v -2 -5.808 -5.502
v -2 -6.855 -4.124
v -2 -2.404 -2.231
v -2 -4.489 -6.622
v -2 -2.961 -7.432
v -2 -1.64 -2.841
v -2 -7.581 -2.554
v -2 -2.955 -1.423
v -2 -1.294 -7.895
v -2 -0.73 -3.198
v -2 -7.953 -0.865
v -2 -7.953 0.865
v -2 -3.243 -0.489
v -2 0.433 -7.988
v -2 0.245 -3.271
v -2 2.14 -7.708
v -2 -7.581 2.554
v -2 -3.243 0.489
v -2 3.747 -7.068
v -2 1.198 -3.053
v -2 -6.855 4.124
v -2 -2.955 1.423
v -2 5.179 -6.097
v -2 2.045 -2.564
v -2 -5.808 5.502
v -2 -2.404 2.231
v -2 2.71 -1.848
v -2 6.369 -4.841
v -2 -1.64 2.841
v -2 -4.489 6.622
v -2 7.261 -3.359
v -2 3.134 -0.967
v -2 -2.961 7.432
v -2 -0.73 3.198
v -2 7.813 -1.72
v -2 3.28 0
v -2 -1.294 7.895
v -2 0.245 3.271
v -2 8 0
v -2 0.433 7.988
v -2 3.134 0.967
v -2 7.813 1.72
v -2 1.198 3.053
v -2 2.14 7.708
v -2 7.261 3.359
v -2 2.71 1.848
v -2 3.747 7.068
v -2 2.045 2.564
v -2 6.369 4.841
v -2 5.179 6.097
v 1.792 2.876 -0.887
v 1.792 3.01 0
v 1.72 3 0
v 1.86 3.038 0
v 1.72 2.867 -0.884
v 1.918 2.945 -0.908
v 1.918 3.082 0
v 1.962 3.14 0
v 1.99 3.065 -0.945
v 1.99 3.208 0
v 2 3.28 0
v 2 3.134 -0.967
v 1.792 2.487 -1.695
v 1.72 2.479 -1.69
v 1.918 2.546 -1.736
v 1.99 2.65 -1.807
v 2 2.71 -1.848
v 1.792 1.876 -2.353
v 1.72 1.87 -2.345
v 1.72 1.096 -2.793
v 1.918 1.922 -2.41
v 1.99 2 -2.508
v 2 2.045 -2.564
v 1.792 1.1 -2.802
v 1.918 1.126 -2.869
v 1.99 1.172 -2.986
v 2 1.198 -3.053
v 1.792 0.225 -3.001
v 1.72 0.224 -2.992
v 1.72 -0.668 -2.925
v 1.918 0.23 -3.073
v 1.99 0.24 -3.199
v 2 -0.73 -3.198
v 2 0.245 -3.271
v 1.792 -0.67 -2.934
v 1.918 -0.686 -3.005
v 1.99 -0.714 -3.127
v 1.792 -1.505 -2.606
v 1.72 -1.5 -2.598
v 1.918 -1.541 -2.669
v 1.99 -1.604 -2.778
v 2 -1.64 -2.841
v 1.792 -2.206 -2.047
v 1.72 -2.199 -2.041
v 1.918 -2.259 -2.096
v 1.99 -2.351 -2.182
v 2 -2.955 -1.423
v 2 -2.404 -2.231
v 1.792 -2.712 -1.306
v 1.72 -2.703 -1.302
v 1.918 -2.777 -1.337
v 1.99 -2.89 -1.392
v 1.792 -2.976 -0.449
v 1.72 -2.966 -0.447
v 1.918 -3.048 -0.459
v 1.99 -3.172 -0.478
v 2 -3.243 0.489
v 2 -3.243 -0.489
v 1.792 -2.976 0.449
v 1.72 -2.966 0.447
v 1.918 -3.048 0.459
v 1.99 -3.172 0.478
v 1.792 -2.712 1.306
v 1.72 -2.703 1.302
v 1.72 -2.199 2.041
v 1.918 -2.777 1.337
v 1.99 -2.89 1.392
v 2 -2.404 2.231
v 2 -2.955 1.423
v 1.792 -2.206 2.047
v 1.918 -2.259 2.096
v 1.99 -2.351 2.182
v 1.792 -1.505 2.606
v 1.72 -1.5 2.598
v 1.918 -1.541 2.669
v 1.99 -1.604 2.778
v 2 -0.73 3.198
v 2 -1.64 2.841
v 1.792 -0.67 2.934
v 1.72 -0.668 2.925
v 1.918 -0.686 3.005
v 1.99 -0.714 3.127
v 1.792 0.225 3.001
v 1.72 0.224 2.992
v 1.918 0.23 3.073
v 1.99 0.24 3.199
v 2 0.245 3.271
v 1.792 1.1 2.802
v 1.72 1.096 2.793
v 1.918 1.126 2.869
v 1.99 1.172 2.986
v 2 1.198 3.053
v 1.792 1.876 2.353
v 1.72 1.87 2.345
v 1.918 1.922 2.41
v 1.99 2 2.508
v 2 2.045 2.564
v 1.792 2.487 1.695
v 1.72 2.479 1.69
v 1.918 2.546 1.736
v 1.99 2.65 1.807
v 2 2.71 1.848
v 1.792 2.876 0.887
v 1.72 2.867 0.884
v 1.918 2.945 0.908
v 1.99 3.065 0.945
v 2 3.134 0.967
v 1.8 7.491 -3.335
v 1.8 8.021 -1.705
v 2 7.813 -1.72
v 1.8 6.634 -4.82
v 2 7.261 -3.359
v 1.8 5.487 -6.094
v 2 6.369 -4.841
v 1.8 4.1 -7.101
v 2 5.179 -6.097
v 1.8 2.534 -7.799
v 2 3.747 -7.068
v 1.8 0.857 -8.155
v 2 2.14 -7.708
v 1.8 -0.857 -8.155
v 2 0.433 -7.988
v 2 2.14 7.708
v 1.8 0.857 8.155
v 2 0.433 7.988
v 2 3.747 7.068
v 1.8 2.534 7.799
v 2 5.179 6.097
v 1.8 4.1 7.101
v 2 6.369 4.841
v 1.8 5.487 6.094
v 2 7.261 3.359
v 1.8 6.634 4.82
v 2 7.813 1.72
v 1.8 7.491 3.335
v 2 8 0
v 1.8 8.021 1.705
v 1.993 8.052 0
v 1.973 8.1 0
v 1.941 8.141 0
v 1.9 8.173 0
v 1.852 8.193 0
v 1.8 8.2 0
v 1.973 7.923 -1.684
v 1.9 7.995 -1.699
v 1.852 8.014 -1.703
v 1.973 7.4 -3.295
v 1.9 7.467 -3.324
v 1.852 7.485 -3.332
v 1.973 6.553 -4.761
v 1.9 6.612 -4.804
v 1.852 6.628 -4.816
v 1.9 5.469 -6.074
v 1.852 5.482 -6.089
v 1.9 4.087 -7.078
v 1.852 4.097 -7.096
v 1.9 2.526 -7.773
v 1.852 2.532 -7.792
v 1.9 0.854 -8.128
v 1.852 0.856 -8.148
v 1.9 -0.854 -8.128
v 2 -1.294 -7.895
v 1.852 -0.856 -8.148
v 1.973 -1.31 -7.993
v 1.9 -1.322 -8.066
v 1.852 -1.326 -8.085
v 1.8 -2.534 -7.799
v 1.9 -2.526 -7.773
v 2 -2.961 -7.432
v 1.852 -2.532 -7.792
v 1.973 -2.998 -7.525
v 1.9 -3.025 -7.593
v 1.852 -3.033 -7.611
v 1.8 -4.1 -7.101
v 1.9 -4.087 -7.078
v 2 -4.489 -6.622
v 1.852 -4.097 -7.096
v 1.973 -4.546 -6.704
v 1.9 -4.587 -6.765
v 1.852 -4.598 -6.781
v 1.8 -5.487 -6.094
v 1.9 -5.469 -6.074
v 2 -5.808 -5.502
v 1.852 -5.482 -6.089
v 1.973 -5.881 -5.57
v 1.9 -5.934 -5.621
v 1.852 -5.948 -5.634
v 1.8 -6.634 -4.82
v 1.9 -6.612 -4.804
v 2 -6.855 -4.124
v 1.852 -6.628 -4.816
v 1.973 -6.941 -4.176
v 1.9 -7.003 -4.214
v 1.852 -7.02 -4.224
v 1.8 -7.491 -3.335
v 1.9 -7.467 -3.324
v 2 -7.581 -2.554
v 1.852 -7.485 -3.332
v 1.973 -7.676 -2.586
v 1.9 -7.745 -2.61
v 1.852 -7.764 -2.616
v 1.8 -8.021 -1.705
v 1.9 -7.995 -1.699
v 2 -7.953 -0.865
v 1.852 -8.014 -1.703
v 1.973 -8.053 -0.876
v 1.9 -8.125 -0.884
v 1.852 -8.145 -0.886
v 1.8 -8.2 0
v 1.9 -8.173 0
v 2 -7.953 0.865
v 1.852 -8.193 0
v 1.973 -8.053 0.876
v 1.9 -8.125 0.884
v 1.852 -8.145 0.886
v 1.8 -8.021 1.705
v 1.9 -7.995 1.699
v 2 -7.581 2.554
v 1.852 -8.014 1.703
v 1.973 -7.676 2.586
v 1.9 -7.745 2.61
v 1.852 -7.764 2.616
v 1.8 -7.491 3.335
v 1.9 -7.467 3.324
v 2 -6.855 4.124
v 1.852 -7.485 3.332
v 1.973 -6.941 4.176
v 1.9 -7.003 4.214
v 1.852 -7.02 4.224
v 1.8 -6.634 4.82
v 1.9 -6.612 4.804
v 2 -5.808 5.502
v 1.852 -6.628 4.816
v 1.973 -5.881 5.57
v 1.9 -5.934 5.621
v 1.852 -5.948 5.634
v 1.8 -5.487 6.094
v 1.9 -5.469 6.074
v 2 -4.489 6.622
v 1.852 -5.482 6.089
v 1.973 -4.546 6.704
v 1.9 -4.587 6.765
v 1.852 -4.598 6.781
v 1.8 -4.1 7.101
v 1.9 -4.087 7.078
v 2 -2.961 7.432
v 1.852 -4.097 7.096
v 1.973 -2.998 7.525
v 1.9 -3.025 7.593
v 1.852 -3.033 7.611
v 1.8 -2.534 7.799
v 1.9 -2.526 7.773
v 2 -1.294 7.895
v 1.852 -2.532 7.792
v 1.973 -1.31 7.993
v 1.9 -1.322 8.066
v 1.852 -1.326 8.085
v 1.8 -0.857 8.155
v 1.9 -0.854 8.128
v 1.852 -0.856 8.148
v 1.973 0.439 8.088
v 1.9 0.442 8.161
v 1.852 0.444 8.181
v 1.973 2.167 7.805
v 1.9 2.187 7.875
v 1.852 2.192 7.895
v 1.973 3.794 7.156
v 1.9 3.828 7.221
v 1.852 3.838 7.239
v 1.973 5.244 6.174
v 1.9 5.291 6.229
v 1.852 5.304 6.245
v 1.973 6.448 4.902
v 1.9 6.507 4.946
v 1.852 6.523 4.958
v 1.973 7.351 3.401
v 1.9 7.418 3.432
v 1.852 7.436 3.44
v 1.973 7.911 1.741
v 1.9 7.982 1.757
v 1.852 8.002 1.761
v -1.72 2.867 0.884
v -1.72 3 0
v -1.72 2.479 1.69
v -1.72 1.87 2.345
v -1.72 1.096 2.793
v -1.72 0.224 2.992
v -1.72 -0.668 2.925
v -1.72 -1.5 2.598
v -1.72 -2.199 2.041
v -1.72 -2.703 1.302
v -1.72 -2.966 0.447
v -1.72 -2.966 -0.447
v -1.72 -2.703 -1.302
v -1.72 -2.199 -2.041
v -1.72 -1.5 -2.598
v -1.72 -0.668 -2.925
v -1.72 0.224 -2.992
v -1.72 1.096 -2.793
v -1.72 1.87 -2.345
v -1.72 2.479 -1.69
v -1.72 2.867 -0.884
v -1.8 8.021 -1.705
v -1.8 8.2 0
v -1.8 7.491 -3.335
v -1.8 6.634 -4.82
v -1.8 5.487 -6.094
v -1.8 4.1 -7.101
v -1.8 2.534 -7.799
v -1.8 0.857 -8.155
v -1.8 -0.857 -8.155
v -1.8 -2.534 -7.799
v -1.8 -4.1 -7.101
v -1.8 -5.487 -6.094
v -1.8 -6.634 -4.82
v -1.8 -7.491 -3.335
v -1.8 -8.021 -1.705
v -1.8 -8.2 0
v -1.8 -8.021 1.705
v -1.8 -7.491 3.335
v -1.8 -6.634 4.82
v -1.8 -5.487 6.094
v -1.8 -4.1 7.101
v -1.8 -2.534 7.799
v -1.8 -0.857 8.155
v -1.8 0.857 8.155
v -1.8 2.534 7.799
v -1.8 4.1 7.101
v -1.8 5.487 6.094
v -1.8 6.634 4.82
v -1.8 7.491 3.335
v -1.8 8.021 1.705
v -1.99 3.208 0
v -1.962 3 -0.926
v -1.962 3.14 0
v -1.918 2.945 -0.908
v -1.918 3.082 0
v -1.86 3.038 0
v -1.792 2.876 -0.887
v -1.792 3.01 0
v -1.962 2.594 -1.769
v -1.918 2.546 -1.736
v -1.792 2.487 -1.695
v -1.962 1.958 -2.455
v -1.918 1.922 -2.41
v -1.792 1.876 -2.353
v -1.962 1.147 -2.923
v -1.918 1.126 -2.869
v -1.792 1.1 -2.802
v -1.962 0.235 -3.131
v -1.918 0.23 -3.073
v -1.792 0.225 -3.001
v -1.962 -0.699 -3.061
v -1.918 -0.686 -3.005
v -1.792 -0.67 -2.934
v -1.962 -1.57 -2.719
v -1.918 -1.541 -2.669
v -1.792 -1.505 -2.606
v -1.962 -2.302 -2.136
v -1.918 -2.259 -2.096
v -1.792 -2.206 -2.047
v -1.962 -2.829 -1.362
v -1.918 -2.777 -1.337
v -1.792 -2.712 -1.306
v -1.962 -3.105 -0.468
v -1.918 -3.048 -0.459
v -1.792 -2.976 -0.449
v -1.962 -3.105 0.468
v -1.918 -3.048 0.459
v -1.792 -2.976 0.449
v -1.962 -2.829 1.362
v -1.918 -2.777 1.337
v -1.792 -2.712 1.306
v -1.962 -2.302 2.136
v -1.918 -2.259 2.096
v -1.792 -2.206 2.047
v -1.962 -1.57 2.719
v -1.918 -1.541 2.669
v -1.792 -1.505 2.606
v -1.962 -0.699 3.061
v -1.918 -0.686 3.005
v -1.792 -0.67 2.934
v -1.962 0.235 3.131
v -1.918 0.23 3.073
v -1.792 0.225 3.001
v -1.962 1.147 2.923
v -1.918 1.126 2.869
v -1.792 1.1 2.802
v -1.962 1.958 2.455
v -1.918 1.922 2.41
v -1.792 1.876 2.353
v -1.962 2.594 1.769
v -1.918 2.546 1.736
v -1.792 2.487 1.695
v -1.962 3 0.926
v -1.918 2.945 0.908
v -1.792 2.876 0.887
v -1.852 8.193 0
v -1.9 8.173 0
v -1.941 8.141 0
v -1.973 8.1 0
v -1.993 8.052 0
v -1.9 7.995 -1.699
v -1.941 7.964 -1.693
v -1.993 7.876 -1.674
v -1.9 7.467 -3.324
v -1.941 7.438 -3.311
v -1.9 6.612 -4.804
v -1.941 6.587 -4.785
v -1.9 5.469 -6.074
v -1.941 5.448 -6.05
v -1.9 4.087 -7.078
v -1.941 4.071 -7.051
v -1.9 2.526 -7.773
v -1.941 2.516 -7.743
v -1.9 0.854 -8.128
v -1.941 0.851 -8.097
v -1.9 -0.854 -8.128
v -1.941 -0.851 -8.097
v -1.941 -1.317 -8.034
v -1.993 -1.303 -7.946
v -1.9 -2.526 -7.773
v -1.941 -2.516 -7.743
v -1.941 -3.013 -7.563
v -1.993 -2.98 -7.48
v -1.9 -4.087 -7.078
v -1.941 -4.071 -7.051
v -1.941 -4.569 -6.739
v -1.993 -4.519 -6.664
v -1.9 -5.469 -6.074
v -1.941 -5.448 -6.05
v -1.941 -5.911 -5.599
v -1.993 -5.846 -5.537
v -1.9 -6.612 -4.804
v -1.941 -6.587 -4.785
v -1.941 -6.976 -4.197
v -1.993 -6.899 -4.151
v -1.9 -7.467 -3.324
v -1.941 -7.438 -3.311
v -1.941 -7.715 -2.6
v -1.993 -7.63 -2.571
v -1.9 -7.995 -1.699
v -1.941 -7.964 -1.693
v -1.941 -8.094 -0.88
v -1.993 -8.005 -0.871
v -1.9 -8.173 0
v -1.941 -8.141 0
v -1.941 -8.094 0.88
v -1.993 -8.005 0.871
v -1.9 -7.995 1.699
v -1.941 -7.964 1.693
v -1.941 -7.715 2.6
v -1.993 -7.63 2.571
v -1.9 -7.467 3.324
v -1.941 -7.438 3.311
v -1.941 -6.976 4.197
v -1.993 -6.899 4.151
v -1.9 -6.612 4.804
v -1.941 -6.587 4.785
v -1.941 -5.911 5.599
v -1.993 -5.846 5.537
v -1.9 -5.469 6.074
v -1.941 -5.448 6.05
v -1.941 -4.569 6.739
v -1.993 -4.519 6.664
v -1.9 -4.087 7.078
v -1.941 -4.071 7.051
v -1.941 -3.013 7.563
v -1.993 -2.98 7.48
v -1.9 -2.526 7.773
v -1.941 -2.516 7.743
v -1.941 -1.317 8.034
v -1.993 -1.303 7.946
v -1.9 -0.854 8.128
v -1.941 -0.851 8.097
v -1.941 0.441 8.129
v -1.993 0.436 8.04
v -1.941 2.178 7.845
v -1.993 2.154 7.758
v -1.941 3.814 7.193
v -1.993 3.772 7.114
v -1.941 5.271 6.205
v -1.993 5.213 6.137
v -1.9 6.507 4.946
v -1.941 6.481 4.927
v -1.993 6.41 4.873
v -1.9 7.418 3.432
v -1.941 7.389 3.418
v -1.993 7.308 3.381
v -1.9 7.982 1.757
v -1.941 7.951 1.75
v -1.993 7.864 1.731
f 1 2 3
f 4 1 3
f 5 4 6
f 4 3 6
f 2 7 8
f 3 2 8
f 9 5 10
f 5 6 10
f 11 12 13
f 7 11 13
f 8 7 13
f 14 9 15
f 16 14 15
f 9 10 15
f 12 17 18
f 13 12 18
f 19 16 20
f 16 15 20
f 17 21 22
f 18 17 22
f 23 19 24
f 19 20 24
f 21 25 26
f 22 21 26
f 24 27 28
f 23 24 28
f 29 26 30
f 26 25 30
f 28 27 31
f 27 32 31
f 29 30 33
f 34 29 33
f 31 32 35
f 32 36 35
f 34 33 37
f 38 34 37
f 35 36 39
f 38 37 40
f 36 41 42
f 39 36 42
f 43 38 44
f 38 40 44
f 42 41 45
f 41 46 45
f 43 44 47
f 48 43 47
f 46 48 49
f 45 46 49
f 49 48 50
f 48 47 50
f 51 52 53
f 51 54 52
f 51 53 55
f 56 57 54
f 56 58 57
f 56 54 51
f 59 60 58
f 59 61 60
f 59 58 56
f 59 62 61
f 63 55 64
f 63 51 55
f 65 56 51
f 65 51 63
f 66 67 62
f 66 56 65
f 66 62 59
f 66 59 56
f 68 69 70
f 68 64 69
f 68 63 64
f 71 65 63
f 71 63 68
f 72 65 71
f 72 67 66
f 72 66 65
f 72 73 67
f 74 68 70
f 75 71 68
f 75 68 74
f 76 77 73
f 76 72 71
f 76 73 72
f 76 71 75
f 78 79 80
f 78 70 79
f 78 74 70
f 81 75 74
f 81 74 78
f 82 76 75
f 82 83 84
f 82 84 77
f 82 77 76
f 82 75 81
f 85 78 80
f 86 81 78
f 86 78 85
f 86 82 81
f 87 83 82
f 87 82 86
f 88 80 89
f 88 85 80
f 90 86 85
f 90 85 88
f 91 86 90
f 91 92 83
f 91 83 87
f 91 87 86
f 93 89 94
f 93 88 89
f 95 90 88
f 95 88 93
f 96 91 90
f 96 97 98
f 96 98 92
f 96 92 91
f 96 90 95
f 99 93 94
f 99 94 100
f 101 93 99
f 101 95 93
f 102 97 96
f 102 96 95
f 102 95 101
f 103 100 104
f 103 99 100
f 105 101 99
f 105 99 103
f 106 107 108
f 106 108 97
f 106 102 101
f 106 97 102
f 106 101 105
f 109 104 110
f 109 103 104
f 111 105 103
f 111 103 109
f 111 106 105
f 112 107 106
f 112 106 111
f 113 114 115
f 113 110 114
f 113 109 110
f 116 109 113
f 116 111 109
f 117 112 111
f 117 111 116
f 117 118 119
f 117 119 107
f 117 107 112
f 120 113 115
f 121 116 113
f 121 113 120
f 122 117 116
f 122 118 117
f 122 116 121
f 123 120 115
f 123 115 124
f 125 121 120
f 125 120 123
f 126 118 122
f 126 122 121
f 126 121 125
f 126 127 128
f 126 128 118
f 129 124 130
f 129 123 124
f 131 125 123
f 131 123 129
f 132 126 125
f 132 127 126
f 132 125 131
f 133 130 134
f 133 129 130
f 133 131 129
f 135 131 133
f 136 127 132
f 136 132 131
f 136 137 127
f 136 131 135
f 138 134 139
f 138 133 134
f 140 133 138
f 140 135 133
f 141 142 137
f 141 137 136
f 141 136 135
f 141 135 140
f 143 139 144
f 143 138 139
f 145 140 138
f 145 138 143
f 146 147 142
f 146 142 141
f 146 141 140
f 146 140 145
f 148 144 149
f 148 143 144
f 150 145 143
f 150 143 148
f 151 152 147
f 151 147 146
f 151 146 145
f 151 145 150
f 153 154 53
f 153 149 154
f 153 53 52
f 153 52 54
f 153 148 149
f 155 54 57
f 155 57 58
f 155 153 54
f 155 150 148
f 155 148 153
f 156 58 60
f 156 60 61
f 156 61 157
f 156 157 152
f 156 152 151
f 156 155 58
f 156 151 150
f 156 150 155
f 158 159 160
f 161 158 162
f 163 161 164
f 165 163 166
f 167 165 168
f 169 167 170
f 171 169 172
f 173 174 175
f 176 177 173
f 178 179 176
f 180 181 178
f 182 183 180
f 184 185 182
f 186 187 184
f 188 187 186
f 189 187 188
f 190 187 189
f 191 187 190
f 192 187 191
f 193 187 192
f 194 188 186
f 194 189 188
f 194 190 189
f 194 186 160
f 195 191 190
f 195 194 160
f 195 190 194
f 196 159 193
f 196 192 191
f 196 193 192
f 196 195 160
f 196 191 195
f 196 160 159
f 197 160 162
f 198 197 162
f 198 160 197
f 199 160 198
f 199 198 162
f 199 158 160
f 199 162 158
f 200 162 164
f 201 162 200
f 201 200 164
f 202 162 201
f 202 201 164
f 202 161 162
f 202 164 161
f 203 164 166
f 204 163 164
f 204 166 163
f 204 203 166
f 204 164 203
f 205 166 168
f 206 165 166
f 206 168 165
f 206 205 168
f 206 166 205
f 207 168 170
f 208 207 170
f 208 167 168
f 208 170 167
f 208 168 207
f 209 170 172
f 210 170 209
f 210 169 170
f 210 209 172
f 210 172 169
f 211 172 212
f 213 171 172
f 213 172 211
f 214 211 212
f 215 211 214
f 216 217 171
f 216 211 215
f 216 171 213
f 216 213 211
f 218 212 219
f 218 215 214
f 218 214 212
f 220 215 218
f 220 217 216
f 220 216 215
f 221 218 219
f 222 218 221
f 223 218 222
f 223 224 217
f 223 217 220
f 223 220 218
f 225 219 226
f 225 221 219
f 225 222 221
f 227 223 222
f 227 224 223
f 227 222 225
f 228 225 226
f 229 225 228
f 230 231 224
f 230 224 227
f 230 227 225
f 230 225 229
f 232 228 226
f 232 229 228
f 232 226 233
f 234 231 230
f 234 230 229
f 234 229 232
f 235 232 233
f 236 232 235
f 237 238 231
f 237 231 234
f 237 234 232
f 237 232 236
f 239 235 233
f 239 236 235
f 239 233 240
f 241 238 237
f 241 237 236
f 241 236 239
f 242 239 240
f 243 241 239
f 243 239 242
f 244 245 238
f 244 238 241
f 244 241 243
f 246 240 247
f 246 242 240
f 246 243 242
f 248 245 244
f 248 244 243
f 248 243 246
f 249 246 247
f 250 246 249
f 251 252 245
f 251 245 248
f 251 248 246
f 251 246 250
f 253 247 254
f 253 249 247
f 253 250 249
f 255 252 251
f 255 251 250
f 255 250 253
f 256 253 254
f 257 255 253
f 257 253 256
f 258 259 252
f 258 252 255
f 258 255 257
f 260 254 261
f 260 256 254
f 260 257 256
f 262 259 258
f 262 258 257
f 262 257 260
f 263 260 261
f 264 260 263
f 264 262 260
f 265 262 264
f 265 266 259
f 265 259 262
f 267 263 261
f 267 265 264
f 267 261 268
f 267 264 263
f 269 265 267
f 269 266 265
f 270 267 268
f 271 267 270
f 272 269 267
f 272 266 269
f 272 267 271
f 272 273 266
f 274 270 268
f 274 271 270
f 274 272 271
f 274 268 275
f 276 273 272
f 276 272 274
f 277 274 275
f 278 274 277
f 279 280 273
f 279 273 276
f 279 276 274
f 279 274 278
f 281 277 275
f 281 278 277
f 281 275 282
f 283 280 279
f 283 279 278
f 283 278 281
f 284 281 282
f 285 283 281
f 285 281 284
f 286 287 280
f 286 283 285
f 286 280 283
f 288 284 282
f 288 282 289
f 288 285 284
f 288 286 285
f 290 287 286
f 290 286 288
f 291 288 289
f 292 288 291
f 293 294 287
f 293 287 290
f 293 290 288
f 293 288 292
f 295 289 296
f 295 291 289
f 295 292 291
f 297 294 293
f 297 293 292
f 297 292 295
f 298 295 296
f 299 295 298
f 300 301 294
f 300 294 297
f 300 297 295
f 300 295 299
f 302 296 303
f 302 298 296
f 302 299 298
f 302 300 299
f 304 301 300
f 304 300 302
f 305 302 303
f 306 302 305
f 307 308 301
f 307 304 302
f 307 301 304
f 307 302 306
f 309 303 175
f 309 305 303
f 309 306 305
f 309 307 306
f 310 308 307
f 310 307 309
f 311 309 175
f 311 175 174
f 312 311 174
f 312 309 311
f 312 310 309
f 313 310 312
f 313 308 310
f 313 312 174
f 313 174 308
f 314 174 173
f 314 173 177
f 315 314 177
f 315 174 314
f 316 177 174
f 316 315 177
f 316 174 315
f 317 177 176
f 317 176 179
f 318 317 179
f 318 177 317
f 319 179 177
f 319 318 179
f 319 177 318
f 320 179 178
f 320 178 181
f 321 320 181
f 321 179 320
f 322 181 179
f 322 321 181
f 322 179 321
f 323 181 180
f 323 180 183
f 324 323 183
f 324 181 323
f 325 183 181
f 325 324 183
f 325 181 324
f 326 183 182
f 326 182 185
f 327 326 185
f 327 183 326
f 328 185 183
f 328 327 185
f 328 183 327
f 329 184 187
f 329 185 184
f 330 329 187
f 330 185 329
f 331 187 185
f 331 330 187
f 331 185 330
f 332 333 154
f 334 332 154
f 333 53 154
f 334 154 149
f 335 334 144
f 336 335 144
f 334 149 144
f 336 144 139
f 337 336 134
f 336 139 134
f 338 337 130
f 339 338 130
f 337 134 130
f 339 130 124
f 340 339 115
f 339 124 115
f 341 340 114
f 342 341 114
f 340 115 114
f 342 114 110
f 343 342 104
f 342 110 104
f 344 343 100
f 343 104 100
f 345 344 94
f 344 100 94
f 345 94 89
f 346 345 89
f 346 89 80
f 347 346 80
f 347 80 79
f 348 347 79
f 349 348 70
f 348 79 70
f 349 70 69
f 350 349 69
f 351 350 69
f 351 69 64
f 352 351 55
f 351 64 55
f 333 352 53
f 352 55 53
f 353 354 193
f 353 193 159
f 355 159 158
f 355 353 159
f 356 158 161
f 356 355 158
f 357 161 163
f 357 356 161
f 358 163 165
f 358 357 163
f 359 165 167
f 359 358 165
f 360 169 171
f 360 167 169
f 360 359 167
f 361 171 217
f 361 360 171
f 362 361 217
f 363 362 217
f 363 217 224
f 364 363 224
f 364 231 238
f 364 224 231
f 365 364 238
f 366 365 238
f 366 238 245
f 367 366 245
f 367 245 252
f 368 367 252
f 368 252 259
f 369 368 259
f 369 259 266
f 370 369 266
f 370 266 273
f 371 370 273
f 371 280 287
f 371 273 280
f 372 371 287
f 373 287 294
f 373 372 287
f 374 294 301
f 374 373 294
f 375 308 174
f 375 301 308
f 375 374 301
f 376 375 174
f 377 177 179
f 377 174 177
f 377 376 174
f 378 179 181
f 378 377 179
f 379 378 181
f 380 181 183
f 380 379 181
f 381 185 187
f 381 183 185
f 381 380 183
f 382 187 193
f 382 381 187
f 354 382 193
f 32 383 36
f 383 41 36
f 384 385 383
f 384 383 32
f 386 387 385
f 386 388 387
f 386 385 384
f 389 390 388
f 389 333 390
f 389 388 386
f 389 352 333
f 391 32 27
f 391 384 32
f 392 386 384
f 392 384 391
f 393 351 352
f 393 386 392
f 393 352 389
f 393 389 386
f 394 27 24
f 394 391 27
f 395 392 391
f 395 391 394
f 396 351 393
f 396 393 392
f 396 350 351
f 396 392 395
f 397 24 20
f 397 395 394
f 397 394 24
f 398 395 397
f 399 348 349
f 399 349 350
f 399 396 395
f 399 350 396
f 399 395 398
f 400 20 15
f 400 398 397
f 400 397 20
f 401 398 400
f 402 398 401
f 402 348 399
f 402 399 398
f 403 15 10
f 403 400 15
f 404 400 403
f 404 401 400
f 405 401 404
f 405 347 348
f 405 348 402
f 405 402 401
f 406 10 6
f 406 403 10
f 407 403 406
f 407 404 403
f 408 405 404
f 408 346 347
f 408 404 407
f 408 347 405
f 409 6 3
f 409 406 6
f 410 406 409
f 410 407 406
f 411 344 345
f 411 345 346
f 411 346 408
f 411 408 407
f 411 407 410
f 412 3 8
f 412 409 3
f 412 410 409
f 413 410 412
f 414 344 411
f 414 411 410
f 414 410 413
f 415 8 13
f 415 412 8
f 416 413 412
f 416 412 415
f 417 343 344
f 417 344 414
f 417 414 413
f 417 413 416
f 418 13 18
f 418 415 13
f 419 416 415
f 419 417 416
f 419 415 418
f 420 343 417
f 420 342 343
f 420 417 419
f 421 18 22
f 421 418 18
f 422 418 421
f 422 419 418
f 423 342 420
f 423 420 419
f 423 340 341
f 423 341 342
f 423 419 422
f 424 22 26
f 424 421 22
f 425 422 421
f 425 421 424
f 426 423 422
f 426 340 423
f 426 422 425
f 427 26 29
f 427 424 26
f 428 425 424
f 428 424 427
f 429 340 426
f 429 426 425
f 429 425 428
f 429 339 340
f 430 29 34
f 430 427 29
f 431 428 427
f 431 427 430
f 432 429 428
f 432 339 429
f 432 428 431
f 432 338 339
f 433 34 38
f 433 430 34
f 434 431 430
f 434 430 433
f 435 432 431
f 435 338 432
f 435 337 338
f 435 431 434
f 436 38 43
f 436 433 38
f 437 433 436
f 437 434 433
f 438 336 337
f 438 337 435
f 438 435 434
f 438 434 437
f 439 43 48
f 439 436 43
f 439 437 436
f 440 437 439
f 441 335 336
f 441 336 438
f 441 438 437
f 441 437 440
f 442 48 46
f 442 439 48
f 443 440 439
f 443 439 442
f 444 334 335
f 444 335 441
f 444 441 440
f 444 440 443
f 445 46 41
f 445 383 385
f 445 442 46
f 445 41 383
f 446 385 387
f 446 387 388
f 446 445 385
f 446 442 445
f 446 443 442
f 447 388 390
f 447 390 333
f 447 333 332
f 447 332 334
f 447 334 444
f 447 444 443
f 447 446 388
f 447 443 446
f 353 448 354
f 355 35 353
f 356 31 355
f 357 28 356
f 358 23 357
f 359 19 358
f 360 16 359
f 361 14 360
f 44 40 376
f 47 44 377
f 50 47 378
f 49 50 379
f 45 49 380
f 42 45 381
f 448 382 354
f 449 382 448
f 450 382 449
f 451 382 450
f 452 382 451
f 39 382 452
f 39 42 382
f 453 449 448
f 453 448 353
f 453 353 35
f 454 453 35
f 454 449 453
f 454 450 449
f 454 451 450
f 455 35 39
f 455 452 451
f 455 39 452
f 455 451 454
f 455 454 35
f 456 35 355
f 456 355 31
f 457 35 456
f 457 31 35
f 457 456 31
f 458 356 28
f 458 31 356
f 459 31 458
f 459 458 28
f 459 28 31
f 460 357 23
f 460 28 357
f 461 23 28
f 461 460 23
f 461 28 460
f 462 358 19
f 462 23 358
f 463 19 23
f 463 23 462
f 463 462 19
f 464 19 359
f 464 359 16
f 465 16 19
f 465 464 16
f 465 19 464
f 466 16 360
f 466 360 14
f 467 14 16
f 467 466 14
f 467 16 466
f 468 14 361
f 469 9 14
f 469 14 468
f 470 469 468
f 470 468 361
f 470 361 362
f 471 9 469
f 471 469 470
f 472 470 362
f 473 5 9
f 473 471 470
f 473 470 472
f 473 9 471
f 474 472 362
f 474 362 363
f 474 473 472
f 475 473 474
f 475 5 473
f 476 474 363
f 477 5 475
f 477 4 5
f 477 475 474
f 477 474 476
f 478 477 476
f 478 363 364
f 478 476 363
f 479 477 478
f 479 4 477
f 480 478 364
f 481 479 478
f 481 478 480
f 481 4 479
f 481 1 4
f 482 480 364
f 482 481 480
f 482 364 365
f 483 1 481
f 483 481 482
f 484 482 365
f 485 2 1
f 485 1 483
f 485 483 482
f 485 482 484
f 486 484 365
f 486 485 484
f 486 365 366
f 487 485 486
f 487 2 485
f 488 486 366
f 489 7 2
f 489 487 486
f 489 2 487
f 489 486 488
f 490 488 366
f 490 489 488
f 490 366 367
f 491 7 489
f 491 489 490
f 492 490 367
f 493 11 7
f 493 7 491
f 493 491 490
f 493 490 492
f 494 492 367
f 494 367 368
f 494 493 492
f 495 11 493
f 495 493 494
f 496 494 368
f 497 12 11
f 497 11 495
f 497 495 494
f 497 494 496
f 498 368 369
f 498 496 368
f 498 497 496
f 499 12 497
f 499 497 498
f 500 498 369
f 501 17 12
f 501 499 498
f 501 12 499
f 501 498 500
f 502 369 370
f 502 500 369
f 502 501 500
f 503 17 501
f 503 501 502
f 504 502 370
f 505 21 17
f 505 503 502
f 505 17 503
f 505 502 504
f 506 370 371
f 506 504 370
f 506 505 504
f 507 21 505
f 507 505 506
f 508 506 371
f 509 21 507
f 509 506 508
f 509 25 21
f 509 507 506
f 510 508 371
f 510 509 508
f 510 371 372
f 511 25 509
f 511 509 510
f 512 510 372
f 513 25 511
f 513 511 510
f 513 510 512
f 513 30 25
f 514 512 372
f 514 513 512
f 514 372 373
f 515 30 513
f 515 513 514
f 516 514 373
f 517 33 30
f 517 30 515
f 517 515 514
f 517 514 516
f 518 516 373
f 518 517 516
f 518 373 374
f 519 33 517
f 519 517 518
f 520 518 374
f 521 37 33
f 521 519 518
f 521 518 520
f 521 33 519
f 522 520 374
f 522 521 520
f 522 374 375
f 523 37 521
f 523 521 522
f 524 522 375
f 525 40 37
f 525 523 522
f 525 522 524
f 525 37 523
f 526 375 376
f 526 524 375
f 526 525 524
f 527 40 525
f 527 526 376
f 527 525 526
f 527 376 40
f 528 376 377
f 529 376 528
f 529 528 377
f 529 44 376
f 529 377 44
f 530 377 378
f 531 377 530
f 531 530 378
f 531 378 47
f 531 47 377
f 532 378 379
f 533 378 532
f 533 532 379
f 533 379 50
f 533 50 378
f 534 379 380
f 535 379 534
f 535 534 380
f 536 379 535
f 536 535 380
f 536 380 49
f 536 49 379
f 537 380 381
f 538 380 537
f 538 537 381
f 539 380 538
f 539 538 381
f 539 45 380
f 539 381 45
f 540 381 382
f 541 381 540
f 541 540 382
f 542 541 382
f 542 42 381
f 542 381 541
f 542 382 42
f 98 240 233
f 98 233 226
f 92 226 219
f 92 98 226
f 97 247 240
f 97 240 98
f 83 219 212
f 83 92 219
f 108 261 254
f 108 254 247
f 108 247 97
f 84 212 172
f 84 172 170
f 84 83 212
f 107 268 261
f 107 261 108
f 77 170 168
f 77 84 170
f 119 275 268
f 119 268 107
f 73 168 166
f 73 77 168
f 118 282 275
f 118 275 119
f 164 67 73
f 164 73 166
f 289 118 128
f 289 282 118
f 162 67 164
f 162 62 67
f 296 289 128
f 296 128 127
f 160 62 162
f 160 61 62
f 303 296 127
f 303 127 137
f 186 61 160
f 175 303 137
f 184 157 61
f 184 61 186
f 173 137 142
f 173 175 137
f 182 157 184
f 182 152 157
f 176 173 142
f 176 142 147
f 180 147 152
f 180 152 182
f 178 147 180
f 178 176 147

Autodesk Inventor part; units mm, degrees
sketch "Sketch_4" plane through (0, 0, 0) normal (0, 0, 1) x (1, 0, 0)
  line L0 (50, 0) -> (-50, 0)
  arc A0 (-2, 3.28) -> (-1.72, 3) centre (-1.72, 3.28) ccw
  line L1 (-1.72, 3) -> (1.72, 3)
  arc A1 (1.72, 3) -> (2, 3.28) centre (1.72, 3.28) ccw
  line L2 (2, 3.28) -> (2, 8)
  arc A2 (2, 8) -> (1.8, 8.2) centre (1.8, 8) ccw
  line L3 (1.8, 8.2) -> (-1.8, 8.2)
  arc A3 (-1.8, 8.2) -> (-2, 8) centre (-1.8, 8) ccw
  line L4 (-2, 8) -> (-2, 3.28)
revolve "Revolution1" add sketch "Sketch_4" angle 360 about axis through (50, 0, 0) along (1, 0, 0)
ref_plane "IP_ball_XY" through (0, 0, 0) normal (1, 0, 0) x (0, 0, -1)
ref_plane "IP_ball_YZ" through (0, 0, 0) normal (0, 0, -1) x (0, 1, 0)
ref_plane "IP_ball_ZX" through (0, 0, 0) normal (0, 1, 0) x (1, 0, 0)
properties part number "110202DT-20-L1260ZZ_ball"
